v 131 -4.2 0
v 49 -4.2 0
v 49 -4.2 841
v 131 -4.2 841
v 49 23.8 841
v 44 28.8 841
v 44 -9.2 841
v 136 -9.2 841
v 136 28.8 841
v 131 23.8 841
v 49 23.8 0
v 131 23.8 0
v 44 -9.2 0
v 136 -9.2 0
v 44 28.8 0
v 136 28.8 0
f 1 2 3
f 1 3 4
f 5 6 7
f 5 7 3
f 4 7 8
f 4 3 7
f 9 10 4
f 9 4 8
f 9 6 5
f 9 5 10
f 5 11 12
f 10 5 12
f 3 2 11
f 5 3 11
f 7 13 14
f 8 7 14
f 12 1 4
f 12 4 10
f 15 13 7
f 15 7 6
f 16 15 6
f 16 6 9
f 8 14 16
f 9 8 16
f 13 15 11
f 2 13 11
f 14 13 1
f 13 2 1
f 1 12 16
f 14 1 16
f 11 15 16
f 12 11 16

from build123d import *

# Parameters (mm, degrees)
MASTER_SKETCH_WING_GEOMETRY_MASTER_SKETC_W   = 92
MASTER_SKETCH_WING_GEOMETRY_MASTER_SKETC_H   = 38
MASTER_SKETCH_WING_GEOMETRY_MASTER_SKETC_W_2 = 82
MASTER_SKETCH_WING_GEOMETRY_MASTER_SKETC_H_2 = 28
BOSS_EXTRUDE2_DEPTH                          = 841


with BuildPart() as part:
    # Master sketch-Wing Geometry Master Sketc → Boss-Extrude2 (new body)
    with BuildSketch(Plane.XY):
        with Locations((90.000000001, 9.799999997)):
            Rectangle(MASTER_SKETCH_WING_GEOMETRY_MASTER_SKETC_W, MASTER_SKETCH_WING_GEOMETRY_MASTER_SKETC_H)
        with Locations((90.000000001, 9.799999997)):
            Rectangle(MASTER_SKETCH_WING_GEOMETRY_MASTER_SKETC_W_2, MASTER_SKETCH_WING_GEOMETRY_MASTER_SKETC_H_2, mode=Mode.SUBTRACT)
    extrude(amount=BOSS_EXTRUDE2_DEPTH)


solid = part.part
